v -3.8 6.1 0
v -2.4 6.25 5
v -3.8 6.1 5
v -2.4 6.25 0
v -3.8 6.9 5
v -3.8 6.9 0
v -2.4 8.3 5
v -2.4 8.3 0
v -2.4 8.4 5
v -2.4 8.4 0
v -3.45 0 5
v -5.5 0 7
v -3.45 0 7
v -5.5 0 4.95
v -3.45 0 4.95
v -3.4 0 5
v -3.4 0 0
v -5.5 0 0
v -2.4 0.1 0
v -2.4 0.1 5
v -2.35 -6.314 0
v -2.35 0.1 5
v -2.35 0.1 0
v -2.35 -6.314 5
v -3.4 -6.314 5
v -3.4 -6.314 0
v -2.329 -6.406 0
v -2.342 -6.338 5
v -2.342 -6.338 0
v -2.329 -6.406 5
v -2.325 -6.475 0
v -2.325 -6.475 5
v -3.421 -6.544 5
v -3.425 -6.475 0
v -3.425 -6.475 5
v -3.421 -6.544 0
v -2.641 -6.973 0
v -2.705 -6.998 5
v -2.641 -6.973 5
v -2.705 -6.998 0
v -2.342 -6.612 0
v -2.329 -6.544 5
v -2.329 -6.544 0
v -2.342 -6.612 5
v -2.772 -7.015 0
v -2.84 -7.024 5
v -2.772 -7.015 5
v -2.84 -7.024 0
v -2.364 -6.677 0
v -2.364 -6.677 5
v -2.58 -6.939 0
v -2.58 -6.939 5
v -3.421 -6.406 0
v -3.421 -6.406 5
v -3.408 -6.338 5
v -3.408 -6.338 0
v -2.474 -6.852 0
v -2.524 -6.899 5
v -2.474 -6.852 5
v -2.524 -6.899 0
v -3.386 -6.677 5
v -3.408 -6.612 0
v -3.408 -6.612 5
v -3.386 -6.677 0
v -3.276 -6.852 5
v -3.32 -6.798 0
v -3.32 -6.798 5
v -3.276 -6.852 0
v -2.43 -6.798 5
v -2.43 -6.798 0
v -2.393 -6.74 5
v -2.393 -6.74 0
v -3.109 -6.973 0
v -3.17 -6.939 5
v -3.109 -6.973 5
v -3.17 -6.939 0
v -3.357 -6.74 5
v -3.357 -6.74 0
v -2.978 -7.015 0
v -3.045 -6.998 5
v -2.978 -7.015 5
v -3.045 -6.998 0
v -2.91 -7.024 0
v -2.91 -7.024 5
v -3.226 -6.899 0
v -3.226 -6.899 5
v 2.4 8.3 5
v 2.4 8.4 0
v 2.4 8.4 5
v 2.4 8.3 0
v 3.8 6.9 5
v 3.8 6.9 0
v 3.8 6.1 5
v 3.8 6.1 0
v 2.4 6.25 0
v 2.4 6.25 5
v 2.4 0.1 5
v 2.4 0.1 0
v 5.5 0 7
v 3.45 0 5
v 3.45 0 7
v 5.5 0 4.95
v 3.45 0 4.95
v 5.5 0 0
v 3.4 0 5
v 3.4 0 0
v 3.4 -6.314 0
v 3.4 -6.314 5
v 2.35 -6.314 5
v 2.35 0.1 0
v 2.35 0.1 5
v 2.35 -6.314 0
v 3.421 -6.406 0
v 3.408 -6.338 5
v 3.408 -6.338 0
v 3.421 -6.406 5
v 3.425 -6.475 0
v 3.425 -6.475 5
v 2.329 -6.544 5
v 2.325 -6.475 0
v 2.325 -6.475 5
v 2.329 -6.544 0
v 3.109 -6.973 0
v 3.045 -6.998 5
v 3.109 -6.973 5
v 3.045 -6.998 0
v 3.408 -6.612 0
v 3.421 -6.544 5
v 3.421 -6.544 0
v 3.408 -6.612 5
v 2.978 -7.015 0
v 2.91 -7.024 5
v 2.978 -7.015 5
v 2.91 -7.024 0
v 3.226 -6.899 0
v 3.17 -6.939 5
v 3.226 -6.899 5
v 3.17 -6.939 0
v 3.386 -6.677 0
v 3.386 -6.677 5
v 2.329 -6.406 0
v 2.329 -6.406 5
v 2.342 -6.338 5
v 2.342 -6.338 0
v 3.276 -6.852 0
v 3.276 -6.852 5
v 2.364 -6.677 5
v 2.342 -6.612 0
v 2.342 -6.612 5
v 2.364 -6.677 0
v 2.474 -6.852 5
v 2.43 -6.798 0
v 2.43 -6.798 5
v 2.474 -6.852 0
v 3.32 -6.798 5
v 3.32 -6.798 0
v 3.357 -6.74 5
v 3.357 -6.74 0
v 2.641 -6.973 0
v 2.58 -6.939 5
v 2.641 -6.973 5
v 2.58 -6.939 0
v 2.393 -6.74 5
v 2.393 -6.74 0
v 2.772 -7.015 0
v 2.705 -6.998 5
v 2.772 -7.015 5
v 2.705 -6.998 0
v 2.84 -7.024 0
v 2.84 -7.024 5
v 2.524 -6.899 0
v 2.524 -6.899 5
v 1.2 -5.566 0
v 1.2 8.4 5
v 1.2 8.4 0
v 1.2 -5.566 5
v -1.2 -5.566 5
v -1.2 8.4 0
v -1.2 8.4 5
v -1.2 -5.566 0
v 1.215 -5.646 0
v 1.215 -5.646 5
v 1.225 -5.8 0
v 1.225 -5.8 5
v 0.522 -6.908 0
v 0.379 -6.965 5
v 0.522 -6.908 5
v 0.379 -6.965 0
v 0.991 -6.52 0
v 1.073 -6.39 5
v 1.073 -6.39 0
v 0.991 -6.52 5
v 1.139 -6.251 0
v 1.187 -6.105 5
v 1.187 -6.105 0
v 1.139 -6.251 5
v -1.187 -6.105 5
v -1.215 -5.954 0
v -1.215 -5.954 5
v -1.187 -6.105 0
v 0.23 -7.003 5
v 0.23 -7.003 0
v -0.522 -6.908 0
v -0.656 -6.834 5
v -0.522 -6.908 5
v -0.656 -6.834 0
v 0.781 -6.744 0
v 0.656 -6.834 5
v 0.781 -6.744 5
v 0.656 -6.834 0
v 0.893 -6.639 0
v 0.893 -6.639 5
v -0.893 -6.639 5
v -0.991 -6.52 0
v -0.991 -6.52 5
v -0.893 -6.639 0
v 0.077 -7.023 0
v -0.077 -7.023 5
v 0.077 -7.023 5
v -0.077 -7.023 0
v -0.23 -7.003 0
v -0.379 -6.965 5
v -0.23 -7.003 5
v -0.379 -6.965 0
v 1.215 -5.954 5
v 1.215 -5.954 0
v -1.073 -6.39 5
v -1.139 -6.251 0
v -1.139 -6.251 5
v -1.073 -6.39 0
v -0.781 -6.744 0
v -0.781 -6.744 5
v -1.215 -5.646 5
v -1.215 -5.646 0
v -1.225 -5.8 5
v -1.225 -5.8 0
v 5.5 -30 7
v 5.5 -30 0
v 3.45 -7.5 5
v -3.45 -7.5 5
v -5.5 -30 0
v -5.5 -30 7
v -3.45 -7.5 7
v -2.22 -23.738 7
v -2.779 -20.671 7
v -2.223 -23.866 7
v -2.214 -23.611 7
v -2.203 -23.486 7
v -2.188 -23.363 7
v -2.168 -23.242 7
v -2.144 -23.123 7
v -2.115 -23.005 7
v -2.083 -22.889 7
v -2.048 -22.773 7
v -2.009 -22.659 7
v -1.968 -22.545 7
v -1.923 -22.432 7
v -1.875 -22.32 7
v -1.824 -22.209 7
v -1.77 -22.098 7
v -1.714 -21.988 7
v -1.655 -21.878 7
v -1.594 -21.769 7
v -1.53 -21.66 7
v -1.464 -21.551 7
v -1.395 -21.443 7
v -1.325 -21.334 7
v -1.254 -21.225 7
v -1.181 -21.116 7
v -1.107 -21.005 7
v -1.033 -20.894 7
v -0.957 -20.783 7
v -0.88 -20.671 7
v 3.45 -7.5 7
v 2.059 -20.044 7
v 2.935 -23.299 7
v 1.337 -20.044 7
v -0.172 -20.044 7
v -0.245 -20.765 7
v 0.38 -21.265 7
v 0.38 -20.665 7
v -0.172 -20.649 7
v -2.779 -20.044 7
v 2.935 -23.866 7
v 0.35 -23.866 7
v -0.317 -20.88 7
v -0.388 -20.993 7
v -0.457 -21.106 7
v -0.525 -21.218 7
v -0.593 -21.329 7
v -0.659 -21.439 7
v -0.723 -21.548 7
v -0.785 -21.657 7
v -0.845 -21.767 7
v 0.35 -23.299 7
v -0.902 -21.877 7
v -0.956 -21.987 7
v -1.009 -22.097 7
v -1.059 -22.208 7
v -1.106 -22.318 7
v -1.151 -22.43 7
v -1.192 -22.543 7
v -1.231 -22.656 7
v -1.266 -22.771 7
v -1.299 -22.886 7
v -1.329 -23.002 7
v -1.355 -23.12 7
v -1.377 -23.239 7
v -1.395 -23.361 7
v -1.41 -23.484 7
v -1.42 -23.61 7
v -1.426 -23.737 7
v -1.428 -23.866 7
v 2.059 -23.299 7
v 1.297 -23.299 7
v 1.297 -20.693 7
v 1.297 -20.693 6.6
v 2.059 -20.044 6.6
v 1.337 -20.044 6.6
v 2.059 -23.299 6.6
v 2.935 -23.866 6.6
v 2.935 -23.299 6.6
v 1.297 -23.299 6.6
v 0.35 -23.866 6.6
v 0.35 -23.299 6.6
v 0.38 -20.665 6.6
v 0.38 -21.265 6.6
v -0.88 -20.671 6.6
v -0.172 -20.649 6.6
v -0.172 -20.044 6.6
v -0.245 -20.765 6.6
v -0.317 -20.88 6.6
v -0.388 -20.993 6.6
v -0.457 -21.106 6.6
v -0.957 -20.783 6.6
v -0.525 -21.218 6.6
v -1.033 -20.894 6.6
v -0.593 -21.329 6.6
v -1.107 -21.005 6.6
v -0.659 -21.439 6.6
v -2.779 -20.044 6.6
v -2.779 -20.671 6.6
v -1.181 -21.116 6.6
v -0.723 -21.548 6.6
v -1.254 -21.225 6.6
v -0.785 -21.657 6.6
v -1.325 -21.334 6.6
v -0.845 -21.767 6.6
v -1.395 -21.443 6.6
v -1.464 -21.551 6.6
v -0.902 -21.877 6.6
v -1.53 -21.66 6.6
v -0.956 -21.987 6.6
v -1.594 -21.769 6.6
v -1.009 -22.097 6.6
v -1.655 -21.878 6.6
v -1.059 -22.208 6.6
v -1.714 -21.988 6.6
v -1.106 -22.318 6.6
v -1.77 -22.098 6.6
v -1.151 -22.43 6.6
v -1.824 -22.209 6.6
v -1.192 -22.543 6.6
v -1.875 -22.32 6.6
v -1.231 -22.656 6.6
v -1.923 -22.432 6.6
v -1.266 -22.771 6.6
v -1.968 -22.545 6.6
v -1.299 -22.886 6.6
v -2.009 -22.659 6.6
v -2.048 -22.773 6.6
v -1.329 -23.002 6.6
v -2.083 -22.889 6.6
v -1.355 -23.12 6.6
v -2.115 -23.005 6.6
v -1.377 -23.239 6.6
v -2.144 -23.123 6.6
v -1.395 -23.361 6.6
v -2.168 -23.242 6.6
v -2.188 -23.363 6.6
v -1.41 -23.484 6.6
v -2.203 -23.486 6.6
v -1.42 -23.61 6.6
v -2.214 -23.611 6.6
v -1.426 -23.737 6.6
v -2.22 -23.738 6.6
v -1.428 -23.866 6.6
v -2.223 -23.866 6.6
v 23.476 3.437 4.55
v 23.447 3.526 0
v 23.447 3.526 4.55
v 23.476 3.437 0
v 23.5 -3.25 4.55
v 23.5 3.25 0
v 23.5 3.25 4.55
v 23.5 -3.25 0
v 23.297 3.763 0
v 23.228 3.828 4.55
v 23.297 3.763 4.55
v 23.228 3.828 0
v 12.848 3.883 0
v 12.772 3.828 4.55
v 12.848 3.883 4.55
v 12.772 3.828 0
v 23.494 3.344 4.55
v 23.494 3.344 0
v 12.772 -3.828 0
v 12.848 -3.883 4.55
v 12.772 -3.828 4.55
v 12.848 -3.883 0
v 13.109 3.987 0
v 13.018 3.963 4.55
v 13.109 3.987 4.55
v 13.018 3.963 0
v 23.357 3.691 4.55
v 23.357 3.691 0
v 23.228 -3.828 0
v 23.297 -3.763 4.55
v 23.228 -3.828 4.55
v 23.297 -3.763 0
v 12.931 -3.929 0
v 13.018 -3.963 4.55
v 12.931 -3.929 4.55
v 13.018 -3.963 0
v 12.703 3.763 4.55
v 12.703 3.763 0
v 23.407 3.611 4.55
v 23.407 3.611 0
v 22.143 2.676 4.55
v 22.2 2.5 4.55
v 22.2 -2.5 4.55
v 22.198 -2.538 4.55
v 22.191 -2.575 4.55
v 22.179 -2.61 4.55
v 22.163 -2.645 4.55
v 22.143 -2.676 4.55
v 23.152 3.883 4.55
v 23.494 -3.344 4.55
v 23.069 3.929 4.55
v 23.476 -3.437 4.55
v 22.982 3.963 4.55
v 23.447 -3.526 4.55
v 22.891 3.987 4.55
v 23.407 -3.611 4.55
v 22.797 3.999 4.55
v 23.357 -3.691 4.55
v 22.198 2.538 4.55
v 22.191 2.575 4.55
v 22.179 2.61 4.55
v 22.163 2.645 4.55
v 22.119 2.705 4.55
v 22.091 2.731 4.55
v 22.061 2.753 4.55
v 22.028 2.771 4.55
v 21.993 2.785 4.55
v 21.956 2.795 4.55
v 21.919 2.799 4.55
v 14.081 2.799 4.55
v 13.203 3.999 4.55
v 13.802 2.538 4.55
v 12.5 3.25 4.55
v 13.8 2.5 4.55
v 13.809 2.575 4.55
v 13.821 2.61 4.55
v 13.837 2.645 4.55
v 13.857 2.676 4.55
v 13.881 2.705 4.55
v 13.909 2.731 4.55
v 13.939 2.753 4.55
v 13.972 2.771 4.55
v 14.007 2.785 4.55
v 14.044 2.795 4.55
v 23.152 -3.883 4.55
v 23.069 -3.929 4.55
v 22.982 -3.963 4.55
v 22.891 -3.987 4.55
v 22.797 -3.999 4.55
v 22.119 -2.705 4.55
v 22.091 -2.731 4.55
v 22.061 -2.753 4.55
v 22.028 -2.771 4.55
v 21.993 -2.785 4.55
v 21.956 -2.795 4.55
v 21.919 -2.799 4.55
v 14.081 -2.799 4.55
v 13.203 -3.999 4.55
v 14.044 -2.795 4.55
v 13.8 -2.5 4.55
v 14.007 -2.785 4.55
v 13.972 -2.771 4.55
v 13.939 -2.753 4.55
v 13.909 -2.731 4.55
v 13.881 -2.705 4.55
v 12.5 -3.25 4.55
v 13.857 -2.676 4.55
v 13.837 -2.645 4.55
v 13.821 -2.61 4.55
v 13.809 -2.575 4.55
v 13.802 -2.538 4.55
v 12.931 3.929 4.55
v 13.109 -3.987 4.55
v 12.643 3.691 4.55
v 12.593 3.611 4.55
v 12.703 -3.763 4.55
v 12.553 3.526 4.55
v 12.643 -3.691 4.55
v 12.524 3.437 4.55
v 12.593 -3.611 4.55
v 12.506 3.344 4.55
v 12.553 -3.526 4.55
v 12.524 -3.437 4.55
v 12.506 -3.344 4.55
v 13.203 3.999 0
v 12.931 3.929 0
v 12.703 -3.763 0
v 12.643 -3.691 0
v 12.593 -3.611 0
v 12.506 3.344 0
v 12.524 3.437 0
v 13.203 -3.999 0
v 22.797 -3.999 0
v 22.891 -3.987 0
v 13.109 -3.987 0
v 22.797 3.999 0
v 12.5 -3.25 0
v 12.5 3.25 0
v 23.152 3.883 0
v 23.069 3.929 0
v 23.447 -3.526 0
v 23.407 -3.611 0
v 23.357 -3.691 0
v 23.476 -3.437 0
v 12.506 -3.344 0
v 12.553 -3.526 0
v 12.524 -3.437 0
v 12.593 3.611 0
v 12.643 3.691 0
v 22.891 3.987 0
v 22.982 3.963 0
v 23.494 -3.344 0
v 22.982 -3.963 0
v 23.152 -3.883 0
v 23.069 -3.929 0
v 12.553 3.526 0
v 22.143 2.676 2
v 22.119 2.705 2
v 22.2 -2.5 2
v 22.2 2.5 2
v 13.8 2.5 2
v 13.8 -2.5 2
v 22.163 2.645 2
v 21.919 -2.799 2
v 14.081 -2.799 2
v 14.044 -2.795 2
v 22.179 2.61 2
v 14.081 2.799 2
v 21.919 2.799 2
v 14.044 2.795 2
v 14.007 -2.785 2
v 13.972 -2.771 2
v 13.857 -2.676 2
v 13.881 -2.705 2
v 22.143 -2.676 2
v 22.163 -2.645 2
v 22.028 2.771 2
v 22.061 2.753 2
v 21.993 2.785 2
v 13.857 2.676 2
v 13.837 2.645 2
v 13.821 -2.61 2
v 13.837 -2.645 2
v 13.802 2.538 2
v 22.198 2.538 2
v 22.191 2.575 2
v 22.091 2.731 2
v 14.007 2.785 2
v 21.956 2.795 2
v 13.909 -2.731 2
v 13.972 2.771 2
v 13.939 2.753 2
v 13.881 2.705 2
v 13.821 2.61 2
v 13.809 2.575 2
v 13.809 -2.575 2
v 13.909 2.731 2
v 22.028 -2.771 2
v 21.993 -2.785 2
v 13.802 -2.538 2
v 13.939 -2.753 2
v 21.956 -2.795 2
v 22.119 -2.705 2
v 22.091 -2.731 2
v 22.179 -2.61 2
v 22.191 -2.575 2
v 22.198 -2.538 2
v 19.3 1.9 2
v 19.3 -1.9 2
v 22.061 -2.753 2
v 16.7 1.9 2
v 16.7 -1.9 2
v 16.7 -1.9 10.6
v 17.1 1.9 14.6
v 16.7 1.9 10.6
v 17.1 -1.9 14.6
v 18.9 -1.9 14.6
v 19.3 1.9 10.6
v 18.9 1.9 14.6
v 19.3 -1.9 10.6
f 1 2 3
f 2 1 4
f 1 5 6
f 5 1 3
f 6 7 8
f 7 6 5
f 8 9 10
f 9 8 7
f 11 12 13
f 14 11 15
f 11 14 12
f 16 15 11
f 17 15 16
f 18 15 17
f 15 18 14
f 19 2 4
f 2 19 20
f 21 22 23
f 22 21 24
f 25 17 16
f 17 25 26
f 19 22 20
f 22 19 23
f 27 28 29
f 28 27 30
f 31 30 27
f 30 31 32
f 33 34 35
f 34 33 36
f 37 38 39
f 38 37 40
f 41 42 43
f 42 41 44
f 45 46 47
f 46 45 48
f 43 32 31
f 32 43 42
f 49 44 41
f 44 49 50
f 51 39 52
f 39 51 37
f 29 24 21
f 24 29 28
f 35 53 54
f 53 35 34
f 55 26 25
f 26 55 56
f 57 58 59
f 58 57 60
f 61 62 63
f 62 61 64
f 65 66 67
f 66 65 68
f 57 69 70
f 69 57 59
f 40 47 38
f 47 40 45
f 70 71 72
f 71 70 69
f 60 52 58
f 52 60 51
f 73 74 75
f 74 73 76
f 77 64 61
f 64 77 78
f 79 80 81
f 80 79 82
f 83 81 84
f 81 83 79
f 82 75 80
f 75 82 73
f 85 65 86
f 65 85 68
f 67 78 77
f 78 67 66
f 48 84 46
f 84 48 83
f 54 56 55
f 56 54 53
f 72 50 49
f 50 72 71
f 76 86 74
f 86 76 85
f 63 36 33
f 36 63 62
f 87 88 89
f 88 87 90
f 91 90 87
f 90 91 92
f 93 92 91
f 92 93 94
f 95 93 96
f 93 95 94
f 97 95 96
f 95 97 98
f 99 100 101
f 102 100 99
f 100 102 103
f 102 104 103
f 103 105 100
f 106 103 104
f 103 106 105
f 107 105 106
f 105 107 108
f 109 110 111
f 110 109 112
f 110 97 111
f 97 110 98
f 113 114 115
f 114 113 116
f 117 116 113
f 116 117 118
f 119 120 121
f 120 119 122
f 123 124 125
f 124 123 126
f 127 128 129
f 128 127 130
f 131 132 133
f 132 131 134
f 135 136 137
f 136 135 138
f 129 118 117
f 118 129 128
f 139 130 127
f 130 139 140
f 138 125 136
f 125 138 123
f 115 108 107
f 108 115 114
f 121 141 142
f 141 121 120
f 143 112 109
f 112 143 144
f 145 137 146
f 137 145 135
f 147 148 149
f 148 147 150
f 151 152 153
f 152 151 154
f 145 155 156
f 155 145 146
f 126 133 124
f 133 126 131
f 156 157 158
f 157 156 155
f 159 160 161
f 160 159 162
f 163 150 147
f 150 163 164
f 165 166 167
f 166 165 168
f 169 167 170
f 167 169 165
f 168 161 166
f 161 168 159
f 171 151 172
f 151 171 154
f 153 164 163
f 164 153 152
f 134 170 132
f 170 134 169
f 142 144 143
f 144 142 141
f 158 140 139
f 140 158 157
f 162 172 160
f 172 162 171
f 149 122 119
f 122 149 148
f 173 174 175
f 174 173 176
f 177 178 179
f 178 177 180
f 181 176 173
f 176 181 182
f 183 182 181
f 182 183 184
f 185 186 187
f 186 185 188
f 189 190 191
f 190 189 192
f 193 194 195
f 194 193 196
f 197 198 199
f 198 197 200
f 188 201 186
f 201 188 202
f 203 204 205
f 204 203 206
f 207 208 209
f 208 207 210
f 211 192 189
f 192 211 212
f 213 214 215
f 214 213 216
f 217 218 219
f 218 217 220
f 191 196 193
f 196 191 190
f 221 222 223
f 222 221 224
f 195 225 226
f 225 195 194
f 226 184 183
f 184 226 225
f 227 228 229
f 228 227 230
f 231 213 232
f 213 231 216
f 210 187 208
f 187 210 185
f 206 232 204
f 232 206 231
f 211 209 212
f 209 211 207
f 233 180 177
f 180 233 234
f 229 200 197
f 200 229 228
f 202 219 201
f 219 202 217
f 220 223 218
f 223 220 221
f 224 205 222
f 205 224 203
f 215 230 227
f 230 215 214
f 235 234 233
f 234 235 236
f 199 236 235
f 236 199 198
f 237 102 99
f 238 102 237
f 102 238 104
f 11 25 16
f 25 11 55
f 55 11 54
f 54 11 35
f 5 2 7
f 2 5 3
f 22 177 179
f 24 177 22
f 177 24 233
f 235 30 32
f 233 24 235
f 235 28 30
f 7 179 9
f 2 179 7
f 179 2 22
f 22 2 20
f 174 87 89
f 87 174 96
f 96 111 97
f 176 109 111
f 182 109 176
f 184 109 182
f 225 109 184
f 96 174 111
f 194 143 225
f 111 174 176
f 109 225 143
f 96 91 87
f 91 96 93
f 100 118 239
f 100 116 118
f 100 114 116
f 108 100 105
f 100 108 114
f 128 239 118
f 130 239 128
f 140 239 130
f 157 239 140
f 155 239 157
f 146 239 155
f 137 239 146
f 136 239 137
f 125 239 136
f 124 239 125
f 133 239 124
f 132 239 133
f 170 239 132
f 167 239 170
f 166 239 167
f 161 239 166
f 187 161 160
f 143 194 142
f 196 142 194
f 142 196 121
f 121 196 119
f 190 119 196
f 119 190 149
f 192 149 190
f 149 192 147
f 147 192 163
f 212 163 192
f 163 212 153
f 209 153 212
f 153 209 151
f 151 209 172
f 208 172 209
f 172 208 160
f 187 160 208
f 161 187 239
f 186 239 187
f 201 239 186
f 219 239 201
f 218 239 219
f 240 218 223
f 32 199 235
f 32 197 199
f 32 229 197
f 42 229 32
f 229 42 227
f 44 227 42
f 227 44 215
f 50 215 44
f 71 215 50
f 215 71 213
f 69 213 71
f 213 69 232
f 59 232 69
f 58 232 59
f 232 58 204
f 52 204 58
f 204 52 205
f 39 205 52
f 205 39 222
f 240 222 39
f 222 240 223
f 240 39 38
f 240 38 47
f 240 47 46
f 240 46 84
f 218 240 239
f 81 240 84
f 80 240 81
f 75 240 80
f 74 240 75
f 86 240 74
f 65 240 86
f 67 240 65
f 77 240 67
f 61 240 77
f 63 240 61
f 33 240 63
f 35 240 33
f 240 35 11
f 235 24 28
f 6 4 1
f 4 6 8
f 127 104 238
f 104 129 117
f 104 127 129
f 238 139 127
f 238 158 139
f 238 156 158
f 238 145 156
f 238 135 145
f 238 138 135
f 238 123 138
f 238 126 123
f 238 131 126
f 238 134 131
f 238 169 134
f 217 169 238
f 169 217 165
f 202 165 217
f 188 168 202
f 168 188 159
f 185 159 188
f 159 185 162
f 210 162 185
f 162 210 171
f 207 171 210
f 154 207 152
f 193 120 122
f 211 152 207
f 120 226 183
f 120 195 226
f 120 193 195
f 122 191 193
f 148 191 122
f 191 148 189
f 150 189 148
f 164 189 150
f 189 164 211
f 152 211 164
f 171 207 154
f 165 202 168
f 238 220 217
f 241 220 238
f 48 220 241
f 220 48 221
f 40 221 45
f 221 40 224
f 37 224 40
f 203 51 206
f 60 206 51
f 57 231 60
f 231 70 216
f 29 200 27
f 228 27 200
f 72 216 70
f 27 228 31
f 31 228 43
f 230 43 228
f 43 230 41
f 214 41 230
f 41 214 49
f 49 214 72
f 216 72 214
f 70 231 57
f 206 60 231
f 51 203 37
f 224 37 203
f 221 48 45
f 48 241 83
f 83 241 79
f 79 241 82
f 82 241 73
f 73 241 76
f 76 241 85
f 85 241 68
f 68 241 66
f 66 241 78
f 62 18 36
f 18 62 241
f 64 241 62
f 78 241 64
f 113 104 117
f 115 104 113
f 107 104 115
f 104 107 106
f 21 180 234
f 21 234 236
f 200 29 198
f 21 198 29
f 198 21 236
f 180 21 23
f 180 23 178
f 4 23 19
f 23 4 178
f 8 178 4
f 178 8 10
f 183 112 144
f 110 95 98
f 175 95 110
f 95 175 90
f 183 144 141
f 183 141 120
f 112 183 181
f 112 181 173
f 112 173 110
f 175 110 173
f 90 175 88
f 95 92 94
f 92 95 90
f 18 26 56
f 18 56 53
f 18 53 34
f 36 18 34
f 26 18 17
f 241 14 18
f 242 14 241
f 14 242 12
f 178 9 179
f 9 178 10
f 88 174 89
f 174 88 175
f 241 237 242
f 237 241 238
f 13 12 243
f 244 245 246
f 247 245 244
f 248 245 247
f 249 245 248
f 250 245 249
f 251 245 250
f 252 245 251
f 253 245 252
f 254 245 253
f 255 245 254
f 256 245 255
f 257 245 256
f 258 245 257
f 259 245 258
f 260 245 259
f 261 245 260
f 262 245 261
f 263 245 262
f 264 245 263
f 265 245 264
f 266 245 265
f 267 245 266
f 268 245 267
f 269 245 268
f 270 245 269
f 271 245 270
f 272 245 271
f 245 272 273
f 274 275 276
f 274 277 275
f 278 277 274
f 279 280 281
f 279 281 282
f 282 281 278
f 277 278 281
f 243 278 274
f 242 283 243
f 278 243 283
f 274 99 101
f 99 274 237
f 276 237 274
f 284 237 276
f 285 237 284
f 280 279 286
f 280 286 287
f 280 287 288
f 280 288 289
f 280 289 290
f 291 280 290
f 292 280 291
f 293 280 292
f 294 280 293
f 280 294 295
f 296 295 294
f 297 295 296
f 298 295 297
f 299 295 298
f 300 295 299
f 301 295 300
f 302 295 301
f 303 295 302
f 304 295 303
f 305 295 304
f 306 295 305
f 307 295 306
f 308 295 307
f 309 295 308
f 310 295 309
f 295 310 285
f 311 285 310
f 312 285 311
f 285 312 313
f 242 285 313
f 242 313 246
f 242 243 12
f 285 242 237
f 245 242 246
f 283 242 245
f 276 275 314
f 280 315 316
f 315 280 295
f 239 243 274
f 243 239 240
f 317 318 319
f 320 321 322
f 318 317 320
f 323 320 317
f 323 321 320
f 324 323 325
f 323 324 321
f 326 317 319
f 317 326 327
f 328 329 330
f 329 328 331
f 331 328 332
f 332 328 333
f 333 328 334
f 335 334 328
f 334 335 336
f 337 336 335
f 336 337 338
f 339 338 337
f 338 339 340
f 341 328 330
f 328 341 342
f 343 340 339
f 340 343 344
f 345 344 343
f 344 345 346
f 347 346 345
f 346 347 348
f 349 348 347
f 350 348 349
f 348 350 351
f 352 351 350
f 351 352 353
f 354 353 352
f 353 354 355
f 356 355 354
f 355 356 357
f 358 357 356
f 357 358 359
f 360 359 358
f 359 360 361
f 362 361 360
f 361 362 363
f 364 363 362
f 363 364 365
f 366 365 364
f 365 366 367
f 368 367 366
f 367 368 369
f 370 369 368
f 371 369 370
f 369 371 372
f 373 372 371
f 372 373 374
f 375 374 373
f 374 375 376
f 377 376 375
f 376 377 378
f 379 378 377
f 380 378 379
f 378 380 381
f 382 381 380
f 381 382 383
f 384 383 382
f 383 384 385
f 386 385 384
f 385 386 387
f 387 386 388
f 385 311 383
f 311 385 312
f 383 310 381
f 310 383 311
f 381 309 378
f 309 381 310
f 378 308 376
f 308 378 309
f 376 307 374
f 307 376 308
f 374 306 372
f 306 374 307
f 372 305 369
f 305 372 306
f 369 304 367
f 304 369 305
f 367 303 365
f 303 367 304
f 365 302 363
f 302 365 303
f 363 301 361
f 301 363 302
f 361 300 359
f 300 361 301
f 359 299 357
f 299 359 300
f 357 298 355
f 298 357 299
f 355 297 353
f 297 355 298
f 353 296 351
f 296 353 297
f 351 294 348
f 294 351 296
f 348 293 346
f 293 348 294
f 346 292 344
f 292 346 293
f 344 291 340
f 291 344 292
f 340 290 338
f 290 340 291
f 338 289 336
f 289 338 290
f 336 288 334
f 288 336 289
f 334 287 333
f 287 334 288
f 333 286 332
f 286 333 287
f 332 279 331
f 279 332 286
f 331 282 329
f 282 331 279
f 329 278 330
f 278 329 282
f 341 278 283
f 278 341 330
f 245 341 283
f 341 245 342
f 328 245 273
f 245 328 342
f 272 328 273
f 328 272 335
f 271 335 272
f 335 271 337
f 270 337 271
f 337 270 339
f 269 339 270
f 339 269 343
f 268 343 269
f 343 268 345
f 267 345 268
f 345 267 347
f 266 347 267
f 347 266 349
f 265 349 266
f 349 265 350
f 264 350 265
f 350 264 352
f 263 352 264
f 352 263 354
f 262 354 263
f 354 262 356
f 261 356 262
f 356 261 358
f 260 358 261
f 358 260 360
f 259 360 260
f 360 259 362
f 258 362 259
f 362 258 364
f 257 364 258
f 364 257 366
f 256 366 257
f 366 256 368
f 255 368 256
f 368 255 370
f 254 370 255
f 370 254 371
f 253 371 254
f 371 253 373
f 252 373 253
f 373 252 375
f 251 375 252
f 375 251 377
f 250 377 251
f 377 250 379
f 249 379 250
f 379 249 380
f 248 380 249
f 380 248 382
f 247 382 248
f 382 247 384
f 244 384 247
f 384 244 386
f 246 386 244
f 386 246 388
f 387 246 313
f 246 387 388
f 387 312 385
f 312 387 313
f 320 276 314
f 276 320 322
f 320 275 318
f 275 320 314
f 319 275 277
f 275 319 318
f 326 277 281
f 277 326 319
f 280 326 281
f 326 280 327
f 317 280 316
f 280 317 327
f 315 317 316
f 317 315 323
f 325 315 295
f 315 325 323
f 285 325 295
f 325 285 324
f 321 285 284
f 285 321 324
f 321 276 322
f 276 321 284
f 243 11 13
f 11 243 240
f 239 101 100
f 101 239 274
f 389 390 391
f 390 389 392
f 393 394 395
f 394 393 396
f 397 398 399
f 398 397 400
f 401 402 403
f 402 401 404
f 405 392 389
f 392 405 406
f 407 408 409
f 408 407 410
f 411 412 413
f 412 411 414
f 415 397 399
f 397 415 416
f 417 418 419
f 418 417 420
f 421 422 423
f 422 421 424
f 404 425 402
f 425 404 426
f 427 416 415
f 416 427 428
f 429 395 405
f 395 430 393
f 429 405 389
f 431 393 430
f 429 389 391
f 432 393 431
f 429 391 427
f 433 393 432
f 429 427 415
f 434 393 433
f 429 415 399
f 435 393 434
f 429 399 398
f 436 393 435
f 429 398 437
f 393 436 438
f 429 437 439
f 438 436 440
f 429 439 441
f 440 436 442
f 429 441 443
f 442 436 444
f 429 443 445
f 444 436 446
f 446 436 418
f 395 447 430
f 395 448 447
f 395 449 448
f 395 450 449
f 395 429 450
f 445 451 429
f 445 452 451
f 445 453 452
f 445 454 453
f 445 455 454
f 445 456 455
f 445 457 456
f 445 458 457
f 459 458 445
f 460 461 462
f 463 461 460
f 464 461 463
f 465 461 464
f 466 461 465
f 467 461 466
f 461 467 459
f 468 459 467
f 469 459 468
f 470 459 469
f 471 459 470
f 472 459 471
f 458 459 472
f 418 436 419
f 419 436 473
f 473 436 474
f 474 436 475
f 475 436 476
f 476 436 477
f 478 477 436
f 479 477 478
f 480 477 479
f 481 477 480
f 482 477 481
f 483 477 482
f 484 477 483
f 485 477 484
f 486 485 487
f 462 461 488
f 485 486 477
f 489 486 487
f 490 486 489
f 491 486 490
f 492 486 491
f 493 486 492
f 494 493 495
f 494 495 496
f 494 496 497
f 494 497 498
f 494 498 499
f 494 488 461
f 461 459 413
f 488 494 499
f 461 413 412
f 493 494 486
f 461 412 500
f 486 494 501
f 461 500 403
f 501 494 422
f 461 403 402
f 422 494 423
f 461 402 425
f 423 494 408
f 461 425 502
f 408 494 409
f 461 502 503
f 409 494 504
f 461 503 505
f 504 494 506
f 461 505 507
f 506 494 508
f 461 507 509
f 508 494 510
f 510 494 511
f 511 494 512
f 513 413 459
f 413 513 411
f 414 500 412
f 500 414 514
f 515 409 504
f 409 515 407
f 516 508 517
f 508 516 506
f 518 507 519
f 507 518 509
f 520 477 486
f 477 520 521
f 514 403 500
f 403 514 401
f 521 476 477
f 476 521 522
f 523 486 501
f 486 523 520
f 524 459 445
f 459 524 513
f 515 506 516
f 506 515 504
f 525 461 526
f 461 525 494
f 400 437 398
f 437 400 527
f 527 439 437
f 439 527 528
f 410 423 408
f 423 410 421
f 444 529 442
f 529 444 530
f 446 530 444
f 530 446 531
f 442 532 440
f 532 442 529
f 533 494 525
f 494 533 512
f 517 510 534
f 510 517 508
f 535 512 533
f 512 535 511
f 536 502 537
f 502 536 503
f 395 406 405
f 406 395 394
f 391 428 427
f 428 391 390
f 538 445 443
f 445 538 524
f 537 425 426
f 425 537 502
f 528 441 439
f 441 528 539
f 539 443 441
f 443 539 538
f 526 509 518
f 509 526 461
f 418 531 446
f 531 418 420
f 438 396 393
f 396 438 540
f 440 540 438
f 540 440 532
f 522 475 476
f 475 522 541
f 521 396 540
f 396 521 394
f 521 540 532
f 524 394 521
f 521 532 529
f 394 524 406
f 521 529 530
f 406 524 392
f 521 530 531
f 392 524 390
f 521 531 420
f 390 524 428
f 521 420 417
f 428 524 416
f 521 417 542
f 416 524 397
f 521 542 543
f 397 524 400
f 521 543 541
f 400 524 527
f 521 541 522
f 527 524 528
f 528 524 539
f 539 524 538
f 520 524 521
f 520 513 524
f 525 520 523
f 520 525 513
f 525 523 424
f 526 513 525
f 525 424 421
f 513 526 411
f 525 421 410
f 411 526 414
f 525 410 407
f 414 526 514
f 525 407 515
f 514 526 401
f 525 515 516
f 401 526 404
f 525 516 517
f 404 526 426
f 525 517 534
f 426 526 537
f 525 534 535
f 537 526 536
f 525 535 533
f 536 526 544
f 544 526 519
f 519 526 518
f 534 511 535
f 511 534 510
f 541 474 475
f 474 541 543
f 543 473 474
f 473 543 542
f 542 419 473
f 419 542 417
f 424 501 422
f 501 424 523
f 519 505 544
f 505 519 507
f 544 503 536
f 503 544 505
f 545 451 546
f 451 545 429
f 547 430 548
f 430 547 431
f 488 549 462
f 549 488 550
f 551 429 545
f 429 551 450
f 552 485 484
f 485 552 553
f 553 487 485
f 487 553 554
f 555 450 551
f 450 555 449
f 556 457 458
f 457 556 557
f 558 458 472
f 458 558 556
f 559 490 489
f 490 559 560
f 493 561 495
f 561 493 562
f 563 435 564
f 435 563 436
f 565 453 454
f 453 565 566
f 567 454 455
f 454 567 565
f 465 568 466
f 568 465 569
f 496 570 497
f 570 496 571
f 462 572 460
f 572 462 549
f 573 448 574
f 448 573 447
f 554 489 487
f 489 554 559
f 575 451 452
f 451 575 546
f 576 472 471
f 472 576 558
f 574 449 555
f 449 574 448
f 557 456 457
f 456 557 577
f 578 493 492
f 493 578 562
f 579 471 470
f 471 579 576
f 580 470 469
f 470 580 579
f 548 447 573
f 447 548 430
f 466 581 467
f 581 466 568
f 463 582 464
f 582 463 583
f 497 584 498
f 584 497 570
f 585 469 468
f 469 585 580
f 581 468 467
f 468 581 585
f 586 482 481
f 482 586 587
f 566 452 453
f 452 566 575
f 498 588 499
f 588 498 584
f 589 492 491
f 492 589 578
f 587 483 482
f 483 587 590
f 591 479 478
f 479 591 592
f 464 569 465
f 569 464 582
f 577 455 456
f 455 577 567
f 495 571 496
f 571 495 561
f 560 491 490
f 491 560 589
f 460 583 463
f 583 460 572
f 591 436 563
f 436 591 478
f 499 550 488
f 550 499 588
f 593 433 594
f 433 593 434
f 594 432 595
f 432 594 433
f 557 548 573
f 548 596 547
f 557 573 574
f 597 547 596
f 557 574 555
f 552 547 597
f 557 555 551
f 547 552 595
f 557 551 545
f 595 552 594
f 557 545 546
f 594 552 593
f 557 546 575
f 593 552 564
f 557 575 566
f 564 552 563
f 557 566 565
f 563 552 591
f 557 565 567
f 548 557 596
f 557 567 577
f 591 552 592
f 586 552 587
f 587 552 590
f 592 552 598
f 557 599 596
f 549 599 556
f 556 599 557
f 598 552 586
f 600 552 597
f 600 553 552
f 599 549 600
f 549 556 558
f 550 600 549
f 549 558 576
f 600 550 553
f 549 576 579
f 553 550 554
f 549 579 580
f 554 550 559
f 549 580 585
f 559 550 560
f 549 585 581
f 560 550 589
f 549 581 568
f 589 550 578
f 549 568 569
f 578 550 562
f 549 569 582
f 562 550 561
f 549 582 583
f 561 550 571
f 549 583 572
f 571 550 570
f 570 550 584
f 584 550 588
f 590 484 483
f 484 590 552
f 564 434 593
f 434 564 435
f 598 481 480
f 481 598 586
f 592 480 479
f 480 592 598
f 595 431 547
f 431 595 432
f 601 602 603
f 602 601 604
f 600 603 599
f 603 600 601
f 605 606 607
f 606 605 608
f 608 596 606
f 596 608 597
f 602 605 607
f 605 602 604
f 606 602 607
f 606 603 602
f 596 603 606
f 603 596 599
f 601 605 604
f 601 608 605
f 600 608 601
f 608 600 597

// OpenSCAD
$fn = 50;

difference() {
	union() {
		translate(v = [0.0, 0.0, 0]) {
			rotate(a = [0, 0, 0]) {
				difference() {
					union() {
						translate(v = [0, 0, 0]) {
							rotate(a = [0, 0, 0]) {
								difference() {
									union() {
										translate(v = [-5.5, -30.0, 0]) {
											cube(size = [11.0, 38.4, 5.0]);
										}
									}
									union() {
										translate(v = [0, 0, -0.1]) {
											linear_extrude(height = 5.2) {
												polygon(points = [[-2.4, 0], [-2.4, 6.25], [-3.8, 6.1], [-3.8, 6.8999999999999995], [-2.4, 8.299999999999999], [-2.4, 9.399999999999999], [-5.7, 9.399999999999999], [-5.7, 0]]);
											}
										}
										translate(v = [0, 0, -0.1]) {
											linear_extrude(height = 5.2) {
												polygon(points = [[-2.35, -6.5], [-2.35, -6.3375], [-2.35, -6.175], [-2.35, -6.0125], [-2.35, -5.85], [-2.35, -5.6875], [-2.35, -5.525], [-2.35, -5.3625], [-2.35, -5.2], [-2.35, -5.0375], [-2.35, -4.875], [-2.35, -4.7125], [-2.35, -4.55], [-2.35, -4.3875], [-2.35, -4.225], [-2.35, -4.0625], [-2.35, -3.9], [-2.35, -3.7375], [-2.35, -3.575], [-2.35, -3.4125], [-2.35, -3.25], [-2.35, -3.0875], [-2.35, -2.925], [-2.35, -2.7625], [-2.35, -2.6], [-2.35, -2.4375], [-2.35, -2.2750000000000004], [-2.35, -2.1125], [-2.35, -1.9500000000000002], [-2.35, -1.7874999999999996], [-2.35, -1.625], [-2.35, -1.4625000000000004], [-2.35, -1.2999999999999998], [-2.35, -1.1375000000000002], [-2.35, -0.9749999999999996], [-2.35, -0.8125], [-2.35, -0.6500000000000004], [-2.35, -0.4874999999999998], [-2.35, -0.3250000000000002], [-2.35, -0.16249999999999964], [-2.35, 0.0], [-2.35, 0.1], [-3.4, 0.1], [-3.4, -6.5]]);
											}
										}
										translate(v = [-2.875, -6.475, -0.1]) {
											cylinder(h = 5.2, r = 0.55);
										}
										translate(v = [0, 0, -0.1]) {
											linear_extrude(height = 5.2) {
												polygon(points = [[2.4, 0], [2.4, 6.25], [3.8, 6.1], [3.8, 6.8999999999999995], [2.4, 8.299999999999999], [2.4, 9.399999999999999], [5.7, 9.399999999999999], [5.7, 0]]);
											}
										}
										translate(v = [0, 0, -0.1]) {
											linear_extrude(height = 5.2) {
												polygon(points = [[2.35, -6.5], [2.35, -6.3375], [2.35, -6.175], [2.35, -6.0125], [2.35, -5.85], [2.35, -5.6875], [2.35, -5.525], [2.35, -5.3625], [2.35, -5.2], [2.35, -5.0375], [2.35, -4.875], [2.35, -4.7125], [2.35, -4.55], [2.35, -4.3875], [2.35, -4.225], [2.35, -4.0625], [2.35, -3.9], [2.35, -3.7375], [2.35, -3.575], [2.35, -3.4125], [2.35, -3.25], [2.35, -3.0875], [2.35, -2.925], [2.35, -2.7625], [2.35, -2.6], [2.35, -2.4375], [2.35, -2.2750000000000004], [2.35, -2.1125], [2.35, -1.9500000000000002], [2.35, -1.7874999999999996], [2.35, -1.625], [2.35, -1.4625000000000004], [2.35, -1.2999999999999998], [2.35, -1.1375000000000002], [2.35, -0.9749999999999996], [2.35, -0.8125], [2.35, -0.6500000000000004], [2.35, -0.4874999999999998], [2.35, -0.3250000000000002], [2.35, -0.16249999999999964], [2.35, 0.0], [2.35, 0.1], [3.4, 0.1], [3.4, -6.5]]);
											}
										}
										translate(v = [2.875, -6.475, -0.1]) {
											cylinder(h = 5.2, r = 0.55);
										}
										translate(v = [0, 0, -0.1]) {
											linear_extrude(height = 5.2) {
												polygon(points = [[-1.2, -5.85], [-1.2, -5.632142857142857], [-1.2, -5.414285714285714], [-1.2, -5.196428571428571], [-1.2, -4.978571428571428], [-1.2, -4.760714285714285], [-1.2, -4.542857142857143], [-1.2, -4.324999999999999], [-1.2, -4.107142857142857], [-1.2, -3.8892857142857142], [-1.2, -3.6714285714285713], [-1.2, -3.4535714285714283], [-1.2, -3.2357142857142853], [-1.2, -3.0178571428571423], [-1.2, -2.8], [-1.2, -2.582142857142857], [-1.2, -2.364285714285714], [-1.2, -2.146428571428571], [-1.2, -1.9285714285714284], [-1.2, -1.7107142857142854], [-1.2, -1.4928571428571429], [-1.2, -1.2749999999999995], [-1.2, -1.057142857142857], [-1.2, -0.8392857142857135], [-1.2, -0.621428571428571], [-1.2, -0.40357142857142847], [-1.2, -0.18571428571428505], [-1.2, 0], [-1.2, 0.03214285714285747], [-1.2, 0.25], [-1.2, 0.4678571428571434], [-1.2, 0.6857142857142859], [-1.2, 0.9035714285714294], [-1.2, 1.1214285714285719], [-1.2, 1.3392857142857144], [-1.2, 1.5571428571428578], [-1.2, 1.7750000000000004], [-1.2, 1.9928571428571429], [-1.2, 2.2107142857142854], [-1.2, 2.428571428571429], [-1.2, 2.6464285714285722], [-1.2, 2.864285714285714], [-1.2, 3.0821428571428573], [-1.2, 3.3000000000000007], [-1.2, 3.5178571428571423], [-1.2, 3.7357142857142858], [-1.2, 3.953571428571429], [-1.2, 4.171428571428573], [-1.2, 4.389285714285714], [-1.2, 4.607142857142858], [-1.2, 4.825000000000001], [-1.2, 5.042857142857143], [-1.2, 5.260714285714286], [-1.2, 5.4785714285714295], [-1.2, 5.696428571428571], [-1.2, 5.914285714285715], [-1.2, 6.1], [-1.2, 6.132142857142858], [-1.2, 6.25], [-1.2, 6.35], [-1.2, 6.567857142857143], [-1.2, 6.7857142857142865], [-1.2, 7.003571428571428], [-1.2, 7.2214285714285715], [-1.2, 7.439285714285715], [-1.2, 7.657142857142858], [-1.2, 7.875], [-1.2, 8.092857142857143], [-1.2, 8.310714285714287], [-1.2, 8.528571428571428], [-1.2, 8.746428571428572], [-1.2, 8.964285714285715], [-1.2, 9.182142857142857], [-1.2, 9.4], [1.2, 9.4], [1.2, 9.182142857142857], [1.2, 8.964285714285715], [1.2, 8.746428571428572], [1.2, 8.528571428571428], [1.2, 8.310714285714287], [1.2, 8.092857142857143], [1.2, 7.875], [1.2, 7.657142857142858], [1.2, 7.439285714285715], [1.2, 7.2214285714285715], [1.2, 7.003571428571428], [1.2, 6.7857142857142865], [1.2, 6.567857142857143], [1.2, 6.35], [1.2, 6.25], [1.2, 6.132142857142858], [1.2, 6.1], [1.2, 5.914285714285715], [1.2, 5.696428571428571], [1.2, 5.4785714285714295], [1.2, 5.260714285714286], [1.2, 5.042857142857143], [1.2, 4.825000000000001], [1.2, 4.607142857142858], [1.2, 4.389285714285714], [1.2, 4.171428571428573], [1.2, 3.953571428571429], [1.2, 3.7357142857142858], [1.2, 3.5178571428571423], [1.2, 3.3000000000000007], [1.2, 3.0821428571428573], [1.2, 2.864285714285714], [1.2, 2.6464285714285722], [1.2, 2.428571428571429], [1.2, 2.2107142857142854], [1.2, 1.9928571428571429], [1.2, 1.7750000000000004], [1.2, 1.5571428571428578], [1.2, 1.3392857142857144], [1.2, 1.1214285714285719], [1.2, 0.9035714285714294], [1.2, 0.6857142857142859], [1.2, 0.4678571428571434], [1.2, 0.25], [1.2, 0.03214285714285747], [1.2, 0], [1.2, -0.18571428571428505], [1.2, -0.40357142857142847], [1.2, -0.621428571428571], [1.2, -0.8392857142857135], [1.2, -1.057142857142857], [1.2, -1.2749999999999995], [1.2, -1.4928571428571429], [1.2, -1.7107142857142854], [1.2, -1.9285714285714284], [1.2, -2.146428571428571], [1.2, -2.364285714285714], [1.2, -2.582142857142857], [1.2, -2.8], [1.2, -3.0178571428571423], [1.2, -3.2357142857142853], [1.2, -3.4535714285714283], [1.2, -3.6714285714285713], [1.2, -3.8892857142857142], [1.2, -4.107142857142857], [1.2, -4.324999999999999], [1.2, -4.542857142857143], [1.2, -4.760714285714285], [1.2, -4.978571428571428], [1.2, -5.196428571428571], [1.2, -5.414285714285714], [1.2, -5.632142857142857], [1.2, -5.85]]);
											}
										}
										translate(v = [0, -5.8, -0.1]) {
											cylinder(h = 5.2, r = 1.2249999999999999);
										}
										translate(v = [0, -22, 6.6]) {
											linear_extrude(height = 0.5) {
												text(font = "Arial:style=Bold", halign = "center", size = 4.0, text = "71", valign = "center");
											}
										}
									}
								}
							}
						}
						translate(v = [0, 0, 0]) {
							rotate(a = [0, 0, 0]) {
								difference() {
									union() {
										translate(v = [-5.5, -30.0, 4.95]) {
											cube(size = [11.0, 22.5, 2.05]);
										}
									}
									union() {
										translate(v = [0, -22, 6.6]) {
											linear_extrude(height = 0.5) {
												text(font = "Arial:style=Bold", halign = "center", size = 4.0, text = "71", valign = "center");
											}
										}
									}
								}
							}
						}
						translate(v = [-5.5, -30.0, 4.95]) {
							cube(size = [2.0500000000000003, 30.0, 2.05]);
						}
						translate(v = [3.4499999999999997, -30.0, 4.95]) {
							cube(size = [2.0500000000000003, 30.0, 2.05]);
						}
					}
					union();
				}
			}
		}
		translate(v = [18.0, 0, 0]) {
			rotate(a = [0, 0, 0]) {
				difference() {
					union() {
						translate(v = [0, 0, 0]) {
							rotate(a = [0, 0, 0]) {
								difference() {
									union() {
										hull() {
											translate(v = [-4.75, 3.25, 0]) {
												cylinder(h = 4.55, r = 0.75);
											}
											translate(v = [4.75, 3.25, 0]) {
												cylinder(h = 4.55, r = 0.75);
											}
											translate(v = [-4.75, -3.25, 0]) {
												cylinder(h = 4.55, r = 0.75);
											}
											translate(v = [4.75, -3.25, 0]) {
												cylinder(h = 4.55, r = 0.75);
											}
										}
									}
									union() {
										translate(v = [0, 0, 2.0]) {
											hull() {
												translate(v = [-3.9000000000000004, 2.5, 0]) {
													cylinder(h = 2.65, r = 0.3);
												}
												translate(v = [3.9000000000000004, 2.5, 0]) {
													cylinder(h = 2.65, r = 0.3);
												}
												translate(v = [-3.9000000000000004, -2.5, 0]) {
													cylinder(h = 2.65, r = 0.3);
												}
												translate(v = [3.9000000000000004, -2.5, 0]) {
													cylinder(h = 2.65, r = 0.3);
												}
											}
										}
									}
								}
							}
						}
						translate(v = [0, 0, 0]) {
							rotate(a = [0, 0, 0]) {
								difference() {
									union() {
										translate(v = [-1.4000000000000001, -1.9, 1.95]) {
											cube(size = [2.8000000000000003, 3.8, 12.65]);
										}
									}
									union() {
										translate(v = [0, 2.0, 0]) {
											rotate(a = [90, 0, 0]) {
												linear_extrude(height = 4.0) {
													polygon(points = [[-1.3, 1.85], [-1.3, 10.6], [-0.9, 14.6], [-0.9, 14.799999999999999], [-1.6, 14.799999999999999], [-1.6, 1.85]]);
												}
											}
										}
										translate(v = [0, 2.0, 0]) {
											rotate(a = [90, 0, 0]) {
												linear_extrude(height = 4.0) {
													polygon(points = [[1.3, 1.85], [1.3, 10.6], [0.9, 14.6], [0.9, 14.799999999999999], [1.6, 14.799999999999999], [1.6, 1.85]]);
												}
											}
										}
									}
								}
							}
						}
					}
					union();
				}
			}
		}
	}
	union();
}
